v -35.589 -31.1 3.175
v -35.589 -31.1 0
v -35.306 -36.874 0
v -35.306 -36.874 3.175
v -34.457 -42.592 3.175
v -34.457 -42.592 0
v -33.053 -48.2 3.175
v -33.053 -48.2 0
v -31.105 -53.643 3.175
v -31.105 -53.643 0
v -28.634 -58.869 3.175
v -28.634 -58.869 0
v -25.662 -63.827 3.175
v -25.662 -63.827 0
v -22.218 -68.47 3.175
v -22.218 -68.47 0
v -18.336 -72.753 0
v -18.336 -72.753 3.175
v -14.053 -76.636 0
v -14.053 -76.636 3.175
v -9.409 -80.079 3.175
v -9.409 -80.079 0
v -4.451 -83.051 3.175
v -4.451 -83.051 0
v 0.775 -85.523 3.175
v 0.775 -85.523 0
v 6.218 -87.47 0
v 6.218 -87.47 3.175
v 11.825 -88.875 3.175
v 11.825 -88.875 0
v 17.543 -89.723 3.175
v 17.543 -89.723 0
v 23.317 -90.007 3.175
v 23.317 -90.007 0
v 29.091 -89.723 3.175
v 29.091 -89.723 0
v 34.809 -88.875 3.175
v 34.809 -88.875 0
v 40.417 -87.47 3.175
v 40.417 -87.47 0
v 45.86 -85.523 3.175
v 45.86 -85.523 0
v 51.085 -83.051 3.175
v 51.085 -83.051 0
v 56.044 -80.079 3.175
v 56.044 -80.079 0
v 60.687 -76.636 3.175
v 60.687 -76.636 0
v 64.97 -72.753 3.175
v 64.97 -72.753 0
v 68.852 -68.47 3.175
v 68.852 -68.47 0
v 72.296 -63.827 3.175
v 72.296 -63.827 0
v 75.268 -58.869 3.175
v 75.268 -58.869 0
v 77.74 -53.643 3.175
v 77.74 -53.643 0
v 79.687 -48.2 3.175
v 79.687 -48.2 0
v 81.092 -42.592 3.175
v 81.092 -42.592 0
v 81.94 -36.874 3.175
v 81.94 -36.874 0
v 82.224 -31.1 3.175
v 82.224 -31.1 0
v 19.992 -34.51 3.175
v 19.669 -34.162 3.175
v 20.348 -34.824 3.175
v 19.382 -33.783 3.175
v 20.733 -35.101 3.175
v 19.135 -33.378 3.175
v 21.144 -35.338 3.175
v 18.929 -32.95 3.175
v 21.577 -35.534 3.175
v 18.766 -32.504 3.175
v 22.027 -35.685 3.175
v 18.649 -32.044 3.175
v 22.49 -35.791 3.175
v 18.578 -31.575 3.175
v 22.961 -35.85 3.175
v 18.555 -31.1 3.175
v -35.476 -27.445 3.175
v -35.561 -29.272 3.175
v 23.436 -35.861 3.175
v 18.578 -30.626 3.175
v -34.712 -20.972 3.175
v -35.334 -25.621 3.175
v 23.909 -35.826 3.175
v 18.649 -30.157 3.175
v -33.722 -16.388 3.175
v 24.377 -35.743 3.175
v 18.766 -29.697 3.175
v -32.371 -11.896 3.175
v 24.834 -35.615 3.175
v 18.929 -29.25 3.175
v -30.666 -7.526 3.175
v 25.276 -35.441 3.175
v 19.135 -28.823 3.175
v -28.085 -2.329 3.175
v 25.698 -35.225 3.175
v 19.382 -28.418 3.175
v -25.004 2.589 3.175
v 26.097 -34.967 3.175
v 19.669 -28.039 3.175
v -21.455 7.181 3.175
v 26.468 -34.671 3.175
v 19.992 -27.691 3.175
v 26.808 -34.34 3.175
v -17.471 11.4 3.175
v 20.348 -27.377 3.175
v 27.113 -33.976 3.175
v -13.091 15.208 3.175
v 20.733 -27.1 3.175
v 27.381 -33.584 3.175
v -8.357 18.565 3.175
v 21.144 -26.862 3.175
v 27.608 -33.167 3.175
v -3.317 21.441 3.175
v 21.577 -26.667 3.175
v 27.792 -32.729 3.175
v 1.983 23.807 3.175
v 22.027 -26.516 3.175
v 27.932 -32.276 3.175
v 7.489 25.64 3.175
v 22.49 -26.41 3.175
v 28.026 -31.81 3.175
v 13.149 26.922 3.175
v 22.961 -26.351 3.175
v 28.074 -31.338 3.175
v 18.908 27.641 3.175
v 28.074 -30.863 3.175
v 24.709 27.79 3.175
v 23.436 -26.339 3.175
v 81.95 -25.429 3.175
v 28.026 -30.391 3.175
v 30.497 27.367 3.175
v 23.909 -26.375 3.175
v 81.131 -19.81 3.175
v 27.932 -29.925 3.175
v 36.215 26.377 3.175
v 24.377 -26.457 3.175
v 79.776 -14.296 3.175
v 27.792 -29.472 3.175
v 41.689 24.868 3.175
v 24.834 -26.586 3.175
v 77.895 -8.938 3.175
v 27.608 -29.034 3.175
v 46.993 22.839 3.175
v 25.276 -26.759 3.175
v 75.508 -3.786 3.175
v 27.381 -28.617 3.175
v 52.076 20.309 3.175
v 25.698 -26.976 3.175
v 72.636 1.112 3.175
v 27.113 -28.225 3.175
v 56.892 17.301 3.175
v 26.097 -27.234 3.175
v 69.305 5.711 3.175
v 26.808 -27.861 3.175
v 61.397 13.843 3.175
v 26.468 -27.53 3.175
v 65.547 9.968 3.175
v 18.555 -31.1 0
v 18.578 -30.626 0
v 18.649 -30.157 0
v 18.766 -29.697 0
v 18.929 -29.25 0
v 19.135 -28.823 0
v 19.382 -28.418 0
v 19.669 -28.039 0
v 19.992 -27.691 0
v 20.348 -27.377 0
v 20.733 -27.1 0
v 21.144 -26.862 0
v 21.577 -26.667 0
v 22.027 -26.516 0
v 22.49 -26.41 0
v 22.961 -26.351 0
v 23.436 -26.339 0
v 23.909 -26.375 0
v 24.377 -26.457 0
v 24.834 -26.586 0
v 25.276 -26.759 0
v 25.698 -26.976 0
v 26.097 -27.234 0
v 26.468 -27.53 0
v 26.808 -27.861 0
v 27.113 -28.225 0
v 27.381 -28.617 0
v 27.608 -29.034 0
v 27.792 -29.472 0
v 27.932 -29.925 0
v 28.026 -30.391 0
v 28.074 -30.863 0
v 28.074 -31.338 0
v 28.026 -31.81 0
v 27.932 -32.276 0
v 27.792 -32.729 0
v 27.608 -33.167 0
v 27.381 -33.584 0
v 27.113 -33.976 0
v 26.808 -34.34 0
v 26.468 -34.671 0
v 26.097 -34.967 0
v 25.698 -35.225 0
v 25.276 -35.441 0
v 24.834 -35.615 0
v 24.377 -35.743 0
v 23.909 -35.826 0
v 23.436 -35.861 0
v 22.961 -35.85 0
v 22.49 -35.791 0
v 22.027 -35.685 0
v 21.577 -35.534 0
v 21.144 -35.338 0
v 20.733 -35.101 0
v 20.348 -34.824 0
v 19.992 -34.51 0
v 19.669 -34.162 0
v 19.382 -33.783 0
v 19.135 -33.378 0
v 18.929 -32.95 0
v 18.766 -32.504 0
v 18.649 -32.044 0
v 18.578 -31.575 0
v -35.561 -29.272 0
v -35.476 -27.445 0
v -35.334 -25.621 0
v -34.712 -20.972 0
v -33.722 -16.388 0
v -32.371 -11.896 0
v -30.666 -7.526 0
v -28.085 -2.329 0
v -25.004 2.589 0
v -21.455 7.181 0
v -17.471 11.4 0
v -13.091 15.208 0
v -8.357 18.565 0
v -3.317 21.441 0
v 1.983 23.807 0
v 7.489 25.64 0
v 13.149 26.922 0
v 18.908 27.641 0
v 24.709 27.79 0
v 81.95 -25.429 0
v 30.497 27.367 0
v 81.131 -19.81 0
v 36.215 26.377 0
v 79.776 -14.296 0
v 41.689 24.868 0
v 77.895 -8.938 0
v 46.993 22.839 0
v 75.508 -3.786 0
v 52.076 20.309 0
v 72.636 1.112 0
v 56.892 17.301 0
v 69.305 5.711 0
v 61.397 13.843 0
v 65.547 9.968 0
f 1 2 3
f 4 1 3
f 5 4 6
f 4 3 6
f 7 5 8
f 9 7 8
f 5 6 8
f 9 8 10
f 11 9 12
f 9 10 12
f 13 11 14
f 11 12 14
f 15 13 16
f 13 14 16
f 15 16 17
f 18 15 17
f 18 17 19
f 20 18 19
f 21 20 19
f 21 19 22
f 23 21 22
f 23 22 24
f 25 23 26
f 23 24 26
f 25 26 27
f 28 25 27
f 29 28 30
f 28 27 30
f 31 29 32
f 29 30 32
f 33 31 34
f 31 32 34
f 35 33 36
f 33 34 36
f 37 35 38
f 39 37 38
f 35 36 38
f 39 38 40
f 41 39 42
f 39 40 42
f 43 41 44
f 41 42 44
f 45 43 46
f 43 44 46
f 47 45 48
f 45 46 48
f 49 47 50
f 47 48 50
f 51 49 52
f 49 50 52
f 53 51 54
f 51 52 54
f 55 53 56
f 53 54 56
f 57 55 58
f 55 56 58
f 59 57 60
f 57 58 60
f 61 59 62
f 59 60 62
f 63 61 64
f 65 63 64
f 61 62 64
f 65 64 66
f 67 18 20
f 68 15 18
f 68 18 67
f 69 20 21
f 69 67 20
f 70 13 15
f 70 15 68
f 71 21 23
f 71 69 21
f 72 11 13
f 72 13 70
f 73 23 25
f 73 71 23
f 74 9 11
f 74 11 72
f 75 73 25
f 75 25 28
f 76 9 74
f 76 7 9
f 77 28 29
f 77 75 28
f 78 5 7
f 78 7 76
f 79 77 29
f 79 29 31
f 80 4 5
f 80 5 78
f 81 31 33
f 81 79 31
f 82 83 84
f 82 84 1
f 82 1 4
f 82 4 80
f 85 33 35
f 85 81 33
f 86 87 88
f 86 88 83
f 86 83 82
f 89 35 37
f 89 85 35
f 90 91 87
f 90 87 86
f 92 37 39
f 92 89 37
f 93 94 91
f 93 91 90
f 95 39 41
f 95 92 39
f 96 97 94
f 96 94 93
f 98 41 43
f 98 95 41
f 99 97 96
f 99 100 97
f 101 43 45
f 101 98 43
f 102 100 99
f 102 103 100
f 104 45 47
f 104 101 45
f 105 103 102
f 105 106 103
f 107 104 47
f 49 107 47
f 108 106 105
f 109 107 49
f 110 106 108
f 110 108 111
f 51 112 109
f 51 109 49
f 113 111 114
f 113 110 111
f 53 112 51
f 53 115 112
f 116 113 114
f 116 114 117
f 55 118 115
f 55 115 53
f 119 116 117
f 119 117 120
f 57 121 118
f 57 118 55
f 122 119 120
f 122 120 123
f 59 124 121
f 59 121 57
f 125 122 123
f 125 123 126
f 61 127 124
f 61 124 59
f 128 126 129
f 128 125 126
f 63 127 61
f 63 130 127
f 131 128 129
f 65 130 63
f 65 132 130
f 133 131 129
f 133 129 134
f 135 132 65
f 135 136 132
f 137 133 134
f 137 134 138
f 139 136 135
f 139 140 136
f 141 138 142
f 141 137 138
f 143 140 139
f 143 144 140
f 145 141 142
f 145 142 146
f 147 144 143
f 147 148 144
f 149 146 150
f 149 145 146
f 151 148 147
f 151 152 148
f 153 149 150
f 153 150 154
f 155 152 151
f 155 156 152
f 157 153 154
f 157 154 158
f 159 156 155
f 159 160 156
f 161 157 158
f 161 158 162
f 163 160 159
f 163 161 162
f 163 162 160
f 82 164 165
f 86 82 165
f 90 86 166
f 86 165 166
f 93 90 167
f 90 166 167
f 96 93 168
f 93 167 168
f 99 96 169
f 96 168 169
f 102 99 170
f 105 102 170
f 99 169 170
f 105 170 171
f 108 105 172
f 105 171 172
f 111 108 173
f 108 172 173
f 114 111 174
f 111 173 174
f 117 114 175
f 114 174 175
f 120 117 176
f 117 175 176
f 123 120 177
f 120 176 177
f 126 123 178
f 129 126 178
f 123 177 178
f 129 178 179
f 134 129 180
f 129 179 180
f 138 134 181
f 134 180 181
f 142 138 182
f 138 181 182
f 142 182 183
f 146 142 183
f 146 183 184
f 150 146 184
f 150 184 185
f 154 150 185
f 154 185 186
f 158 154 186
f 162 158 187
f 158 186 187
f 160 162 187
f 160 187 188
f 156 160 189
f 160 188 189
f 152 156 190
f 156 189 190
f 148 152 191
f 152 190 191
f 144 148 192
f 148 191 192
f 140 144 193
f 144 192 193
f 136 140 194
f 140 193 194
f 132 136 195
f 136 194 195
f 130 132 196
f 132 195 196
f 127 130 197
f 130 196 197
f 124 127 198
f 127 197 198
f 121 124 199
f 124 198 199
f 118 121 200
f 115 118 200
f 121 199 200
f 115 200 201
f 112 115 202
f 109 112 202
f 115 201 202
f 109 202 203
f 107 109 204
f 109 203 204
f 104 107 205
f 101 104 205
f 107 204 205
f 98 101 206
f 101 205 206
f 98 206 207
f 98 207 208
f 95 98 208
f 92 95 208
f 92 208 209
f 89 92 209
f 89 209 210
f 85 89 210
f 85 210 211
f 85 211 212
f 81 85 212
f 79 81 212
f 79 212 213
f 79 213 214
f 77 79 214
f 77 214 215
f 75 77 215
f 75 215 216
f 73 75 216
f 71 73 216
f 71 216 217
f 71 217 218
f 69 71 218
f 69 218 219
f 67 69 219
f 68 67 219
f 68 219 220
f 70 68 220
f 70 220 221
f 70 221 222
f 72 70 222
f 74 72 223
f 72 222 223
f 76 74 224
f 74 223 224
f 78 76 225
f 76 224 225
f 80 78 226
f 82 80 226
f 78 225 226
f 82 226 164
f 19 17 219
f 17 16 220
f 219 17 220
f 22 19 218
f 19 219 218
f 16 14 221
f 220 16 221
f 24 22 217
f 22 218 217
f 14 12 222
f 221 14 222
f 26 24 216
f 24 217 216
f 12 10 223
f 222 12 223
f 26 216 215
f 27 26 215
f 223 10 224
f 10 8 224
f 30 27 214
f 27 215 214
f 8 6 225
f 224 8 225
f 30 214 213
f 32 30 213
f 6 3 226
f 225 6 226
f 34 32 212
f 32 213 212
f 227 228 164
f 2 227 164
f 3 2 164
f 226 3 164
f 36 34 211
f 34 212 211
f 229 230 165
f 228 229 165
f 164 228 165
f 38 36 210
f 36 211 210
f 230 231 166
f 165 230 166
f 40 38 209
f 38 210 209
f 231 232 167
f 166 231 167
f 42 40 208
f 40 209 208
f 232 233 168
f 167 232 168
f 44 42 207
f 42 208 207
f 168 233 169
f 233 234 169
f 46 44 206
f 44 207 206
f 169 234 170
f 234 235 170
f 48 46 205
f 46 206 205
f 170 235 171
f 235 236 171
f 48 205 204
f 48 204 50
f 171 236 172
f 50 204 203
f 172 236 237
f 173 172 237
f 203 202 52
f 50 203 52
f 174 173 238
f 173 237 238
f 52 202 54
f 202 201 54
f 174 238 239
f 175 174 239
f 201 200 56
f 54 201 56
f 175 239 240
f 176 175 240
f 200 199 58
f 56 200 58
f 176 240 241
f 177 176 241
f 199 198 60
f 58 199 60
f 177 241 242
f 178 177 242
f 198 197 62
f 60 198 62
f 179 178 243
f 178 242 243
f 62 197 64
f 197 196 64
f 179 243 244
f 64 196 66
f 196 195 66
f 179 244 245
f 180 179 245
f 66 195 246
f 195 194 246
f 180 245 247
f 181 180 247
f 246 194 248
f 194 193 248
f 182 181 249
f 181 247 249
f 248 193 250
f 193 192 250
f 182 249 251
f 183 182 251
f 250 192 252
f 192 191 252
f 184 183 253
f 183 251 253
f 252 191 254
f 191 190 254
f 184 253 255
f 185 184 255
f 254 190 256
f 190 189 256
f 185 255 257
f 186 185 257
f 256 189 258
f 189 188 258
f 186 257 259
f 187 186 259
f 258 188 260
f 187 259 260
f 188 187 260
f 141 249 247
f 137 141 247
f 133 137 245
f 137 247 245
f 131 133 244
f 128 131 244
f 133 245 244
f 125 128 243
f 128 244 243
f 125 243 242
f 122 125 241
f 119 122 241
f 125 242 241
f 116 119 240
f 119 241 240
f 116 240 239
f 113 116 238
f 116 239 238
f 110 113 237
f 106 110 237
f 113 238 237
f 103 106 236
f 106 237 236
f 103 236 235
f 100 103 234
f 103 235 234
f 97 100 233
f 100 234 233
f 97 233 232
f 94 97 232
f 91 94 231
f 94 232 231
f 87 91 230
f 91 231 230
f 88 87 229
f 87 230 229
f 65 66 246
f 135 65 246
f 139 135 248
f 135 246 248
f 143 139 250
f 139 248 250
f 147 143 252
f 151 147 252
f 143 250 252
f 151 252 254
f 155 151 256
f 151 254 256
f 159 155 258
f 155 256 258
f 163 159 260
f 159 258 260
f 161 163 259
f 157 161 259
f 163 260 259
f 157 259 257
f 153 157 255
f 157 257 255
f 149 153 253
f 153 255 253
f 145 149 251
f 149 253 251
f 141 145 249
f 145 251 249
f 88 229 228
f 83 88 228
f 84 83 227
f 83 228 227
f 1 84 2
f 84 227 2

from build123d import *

# Parameters (mm, degrees)
F1_DEPTH = 3.175


# Not quite as in the source:
# - a length typed as a fraction of an inch, garbled in the dataset ("3 / 203.2 mm" for 3/8 in), is restored
# - a feature names something its author has since deleted; it is built from what else it names


with BuildPart() as f1:
    # F0 (on Top) → F1 (new body)
    with BuildSketch(Plane.XY):
        with BuildLine():
            Line((-12.6873488794, 5.5338457858), (-12.6873488794, -31.1003914823))
            ThreePointArc((-12.6873488794, -31.1003914823), (16.4381102813, -21.6348312874), (34.4341148999, 3.1448583573))
            ThreePointArc((34.4341148999, 3.1448583573), (36.2459189148, 10.6981520789), (36.8548431206, 18.4418005177))
            ThreePointArc((36.8548431206, 18.4418005177), (36.6946973558, 22.4220389265), (36.2152954077, 26.3765449929))
            ThreePointArc((36.2152954077, 26.3765449929), (10.5526750719, 26.4063777177), (-12.6873488794, 15.5218814393))
            Line((-12.6873488794, 15.5218814393), (-12.6873488794, 5.5338457858))
        make_face()
        with BuildLine():
            ThreePointArc((34.4341148999, 3.1448583573), (44.4839092315, -60.225850643), (-12.6873488794, -31.1003914823))
            Line((-12.6873488794, -31.1003914823), (-35.5892182517, -31.1003914823))
            ThreePointArc((-35.5892182517, -31.1003914823), (23.3171511206, -90.0067608546), (82.2235204929, -31.1003914823))
            ThreePointArc((82.2235204929, -31.1003914823), (69.3048842905, 5.7111386477), (36.2152954077, 26.3765449929))
            ThreePointArc((36.2152954077, 26.3765449929), (36.6946973558, 22.4220389265), (36.8548431206, 18.4418005177))
            ThreePointArc((36.8548431206, 18.4418005177), (36.2459189148, 10.6981520789), (34.4341148999, 3.1448583573))
        make_face()
        with BuildLine():
            ThreePointArc((34.4341148999, 3.1448583573), (16.4381102813, -21.6348312874), (-12.6873488794, -31.1003914823))
            ThreePointArc((-12.6873488794, -31.1003914823), (44.4839092315, -60.225850643), (34.4341148999, 3.1448583573))
        make_face()
        with BuildLine():
            ThreePointArc((28.0796511206, -31.1003914823), (23.3171511206, -35.8628914823), (18.5546511206, -31.1003914823))
            ThreePointArc((18.5546511206, -31.1003914823), (23.3171511206, -26.3378914823), (28.0796511206, -31.1003914823))
        make_face(mode=Mode.SUBTRACT)
        with BuildLine():
            ThreePointArc((-35.3338578497, -25.6213861535), (-24.3372830845, -29.7111622279), (-12.6873488794, -31.1003914823))
            Line((-12.6873488794, -31.1003914823), (-12.6873488794, 5.5338457858))
            Line((-12.6873488794, 5.5338457858), (-30.6664273508, -7.5263886814))
            ThreePointArc((-30.6664273508, -7.5263886814), (-33.7222633699, -16.3876233128), (-35.3338578497, -25.6213861535))
        make_face()
        with BuildLine():
            Line((-35.5892182517, -31.1003914823), (-12.6873488794, -31.1003914823))
            ThreePointArc((-12.6873488794, -31.1003914823), (-24.3372830845, -29.7111622279), (-35.3338578497, -25.6213861535))
            ThreePointArc((-35.3338578497, -25.6213861535), (-35.5253435202, -28.3579150318), (-35.5892182517, -31.1003914823))
        make_face()
        with BuildLine():
            Line((-30.6664273508, -7.5263886814), (-12.6873488794, 5.5338457858))
            Line((-12.6873488794, 5.5338457858), (-12.6873488794, 15.5218814393))
            ThreePointArc((-12.6873488794, 15.5218814393), (-23.129261611, 5.1306876763), (-30.6664273508, -7.5263886814))
        make_face()
    extrude(amount=F1_DEPTH)


solid = f1.part
